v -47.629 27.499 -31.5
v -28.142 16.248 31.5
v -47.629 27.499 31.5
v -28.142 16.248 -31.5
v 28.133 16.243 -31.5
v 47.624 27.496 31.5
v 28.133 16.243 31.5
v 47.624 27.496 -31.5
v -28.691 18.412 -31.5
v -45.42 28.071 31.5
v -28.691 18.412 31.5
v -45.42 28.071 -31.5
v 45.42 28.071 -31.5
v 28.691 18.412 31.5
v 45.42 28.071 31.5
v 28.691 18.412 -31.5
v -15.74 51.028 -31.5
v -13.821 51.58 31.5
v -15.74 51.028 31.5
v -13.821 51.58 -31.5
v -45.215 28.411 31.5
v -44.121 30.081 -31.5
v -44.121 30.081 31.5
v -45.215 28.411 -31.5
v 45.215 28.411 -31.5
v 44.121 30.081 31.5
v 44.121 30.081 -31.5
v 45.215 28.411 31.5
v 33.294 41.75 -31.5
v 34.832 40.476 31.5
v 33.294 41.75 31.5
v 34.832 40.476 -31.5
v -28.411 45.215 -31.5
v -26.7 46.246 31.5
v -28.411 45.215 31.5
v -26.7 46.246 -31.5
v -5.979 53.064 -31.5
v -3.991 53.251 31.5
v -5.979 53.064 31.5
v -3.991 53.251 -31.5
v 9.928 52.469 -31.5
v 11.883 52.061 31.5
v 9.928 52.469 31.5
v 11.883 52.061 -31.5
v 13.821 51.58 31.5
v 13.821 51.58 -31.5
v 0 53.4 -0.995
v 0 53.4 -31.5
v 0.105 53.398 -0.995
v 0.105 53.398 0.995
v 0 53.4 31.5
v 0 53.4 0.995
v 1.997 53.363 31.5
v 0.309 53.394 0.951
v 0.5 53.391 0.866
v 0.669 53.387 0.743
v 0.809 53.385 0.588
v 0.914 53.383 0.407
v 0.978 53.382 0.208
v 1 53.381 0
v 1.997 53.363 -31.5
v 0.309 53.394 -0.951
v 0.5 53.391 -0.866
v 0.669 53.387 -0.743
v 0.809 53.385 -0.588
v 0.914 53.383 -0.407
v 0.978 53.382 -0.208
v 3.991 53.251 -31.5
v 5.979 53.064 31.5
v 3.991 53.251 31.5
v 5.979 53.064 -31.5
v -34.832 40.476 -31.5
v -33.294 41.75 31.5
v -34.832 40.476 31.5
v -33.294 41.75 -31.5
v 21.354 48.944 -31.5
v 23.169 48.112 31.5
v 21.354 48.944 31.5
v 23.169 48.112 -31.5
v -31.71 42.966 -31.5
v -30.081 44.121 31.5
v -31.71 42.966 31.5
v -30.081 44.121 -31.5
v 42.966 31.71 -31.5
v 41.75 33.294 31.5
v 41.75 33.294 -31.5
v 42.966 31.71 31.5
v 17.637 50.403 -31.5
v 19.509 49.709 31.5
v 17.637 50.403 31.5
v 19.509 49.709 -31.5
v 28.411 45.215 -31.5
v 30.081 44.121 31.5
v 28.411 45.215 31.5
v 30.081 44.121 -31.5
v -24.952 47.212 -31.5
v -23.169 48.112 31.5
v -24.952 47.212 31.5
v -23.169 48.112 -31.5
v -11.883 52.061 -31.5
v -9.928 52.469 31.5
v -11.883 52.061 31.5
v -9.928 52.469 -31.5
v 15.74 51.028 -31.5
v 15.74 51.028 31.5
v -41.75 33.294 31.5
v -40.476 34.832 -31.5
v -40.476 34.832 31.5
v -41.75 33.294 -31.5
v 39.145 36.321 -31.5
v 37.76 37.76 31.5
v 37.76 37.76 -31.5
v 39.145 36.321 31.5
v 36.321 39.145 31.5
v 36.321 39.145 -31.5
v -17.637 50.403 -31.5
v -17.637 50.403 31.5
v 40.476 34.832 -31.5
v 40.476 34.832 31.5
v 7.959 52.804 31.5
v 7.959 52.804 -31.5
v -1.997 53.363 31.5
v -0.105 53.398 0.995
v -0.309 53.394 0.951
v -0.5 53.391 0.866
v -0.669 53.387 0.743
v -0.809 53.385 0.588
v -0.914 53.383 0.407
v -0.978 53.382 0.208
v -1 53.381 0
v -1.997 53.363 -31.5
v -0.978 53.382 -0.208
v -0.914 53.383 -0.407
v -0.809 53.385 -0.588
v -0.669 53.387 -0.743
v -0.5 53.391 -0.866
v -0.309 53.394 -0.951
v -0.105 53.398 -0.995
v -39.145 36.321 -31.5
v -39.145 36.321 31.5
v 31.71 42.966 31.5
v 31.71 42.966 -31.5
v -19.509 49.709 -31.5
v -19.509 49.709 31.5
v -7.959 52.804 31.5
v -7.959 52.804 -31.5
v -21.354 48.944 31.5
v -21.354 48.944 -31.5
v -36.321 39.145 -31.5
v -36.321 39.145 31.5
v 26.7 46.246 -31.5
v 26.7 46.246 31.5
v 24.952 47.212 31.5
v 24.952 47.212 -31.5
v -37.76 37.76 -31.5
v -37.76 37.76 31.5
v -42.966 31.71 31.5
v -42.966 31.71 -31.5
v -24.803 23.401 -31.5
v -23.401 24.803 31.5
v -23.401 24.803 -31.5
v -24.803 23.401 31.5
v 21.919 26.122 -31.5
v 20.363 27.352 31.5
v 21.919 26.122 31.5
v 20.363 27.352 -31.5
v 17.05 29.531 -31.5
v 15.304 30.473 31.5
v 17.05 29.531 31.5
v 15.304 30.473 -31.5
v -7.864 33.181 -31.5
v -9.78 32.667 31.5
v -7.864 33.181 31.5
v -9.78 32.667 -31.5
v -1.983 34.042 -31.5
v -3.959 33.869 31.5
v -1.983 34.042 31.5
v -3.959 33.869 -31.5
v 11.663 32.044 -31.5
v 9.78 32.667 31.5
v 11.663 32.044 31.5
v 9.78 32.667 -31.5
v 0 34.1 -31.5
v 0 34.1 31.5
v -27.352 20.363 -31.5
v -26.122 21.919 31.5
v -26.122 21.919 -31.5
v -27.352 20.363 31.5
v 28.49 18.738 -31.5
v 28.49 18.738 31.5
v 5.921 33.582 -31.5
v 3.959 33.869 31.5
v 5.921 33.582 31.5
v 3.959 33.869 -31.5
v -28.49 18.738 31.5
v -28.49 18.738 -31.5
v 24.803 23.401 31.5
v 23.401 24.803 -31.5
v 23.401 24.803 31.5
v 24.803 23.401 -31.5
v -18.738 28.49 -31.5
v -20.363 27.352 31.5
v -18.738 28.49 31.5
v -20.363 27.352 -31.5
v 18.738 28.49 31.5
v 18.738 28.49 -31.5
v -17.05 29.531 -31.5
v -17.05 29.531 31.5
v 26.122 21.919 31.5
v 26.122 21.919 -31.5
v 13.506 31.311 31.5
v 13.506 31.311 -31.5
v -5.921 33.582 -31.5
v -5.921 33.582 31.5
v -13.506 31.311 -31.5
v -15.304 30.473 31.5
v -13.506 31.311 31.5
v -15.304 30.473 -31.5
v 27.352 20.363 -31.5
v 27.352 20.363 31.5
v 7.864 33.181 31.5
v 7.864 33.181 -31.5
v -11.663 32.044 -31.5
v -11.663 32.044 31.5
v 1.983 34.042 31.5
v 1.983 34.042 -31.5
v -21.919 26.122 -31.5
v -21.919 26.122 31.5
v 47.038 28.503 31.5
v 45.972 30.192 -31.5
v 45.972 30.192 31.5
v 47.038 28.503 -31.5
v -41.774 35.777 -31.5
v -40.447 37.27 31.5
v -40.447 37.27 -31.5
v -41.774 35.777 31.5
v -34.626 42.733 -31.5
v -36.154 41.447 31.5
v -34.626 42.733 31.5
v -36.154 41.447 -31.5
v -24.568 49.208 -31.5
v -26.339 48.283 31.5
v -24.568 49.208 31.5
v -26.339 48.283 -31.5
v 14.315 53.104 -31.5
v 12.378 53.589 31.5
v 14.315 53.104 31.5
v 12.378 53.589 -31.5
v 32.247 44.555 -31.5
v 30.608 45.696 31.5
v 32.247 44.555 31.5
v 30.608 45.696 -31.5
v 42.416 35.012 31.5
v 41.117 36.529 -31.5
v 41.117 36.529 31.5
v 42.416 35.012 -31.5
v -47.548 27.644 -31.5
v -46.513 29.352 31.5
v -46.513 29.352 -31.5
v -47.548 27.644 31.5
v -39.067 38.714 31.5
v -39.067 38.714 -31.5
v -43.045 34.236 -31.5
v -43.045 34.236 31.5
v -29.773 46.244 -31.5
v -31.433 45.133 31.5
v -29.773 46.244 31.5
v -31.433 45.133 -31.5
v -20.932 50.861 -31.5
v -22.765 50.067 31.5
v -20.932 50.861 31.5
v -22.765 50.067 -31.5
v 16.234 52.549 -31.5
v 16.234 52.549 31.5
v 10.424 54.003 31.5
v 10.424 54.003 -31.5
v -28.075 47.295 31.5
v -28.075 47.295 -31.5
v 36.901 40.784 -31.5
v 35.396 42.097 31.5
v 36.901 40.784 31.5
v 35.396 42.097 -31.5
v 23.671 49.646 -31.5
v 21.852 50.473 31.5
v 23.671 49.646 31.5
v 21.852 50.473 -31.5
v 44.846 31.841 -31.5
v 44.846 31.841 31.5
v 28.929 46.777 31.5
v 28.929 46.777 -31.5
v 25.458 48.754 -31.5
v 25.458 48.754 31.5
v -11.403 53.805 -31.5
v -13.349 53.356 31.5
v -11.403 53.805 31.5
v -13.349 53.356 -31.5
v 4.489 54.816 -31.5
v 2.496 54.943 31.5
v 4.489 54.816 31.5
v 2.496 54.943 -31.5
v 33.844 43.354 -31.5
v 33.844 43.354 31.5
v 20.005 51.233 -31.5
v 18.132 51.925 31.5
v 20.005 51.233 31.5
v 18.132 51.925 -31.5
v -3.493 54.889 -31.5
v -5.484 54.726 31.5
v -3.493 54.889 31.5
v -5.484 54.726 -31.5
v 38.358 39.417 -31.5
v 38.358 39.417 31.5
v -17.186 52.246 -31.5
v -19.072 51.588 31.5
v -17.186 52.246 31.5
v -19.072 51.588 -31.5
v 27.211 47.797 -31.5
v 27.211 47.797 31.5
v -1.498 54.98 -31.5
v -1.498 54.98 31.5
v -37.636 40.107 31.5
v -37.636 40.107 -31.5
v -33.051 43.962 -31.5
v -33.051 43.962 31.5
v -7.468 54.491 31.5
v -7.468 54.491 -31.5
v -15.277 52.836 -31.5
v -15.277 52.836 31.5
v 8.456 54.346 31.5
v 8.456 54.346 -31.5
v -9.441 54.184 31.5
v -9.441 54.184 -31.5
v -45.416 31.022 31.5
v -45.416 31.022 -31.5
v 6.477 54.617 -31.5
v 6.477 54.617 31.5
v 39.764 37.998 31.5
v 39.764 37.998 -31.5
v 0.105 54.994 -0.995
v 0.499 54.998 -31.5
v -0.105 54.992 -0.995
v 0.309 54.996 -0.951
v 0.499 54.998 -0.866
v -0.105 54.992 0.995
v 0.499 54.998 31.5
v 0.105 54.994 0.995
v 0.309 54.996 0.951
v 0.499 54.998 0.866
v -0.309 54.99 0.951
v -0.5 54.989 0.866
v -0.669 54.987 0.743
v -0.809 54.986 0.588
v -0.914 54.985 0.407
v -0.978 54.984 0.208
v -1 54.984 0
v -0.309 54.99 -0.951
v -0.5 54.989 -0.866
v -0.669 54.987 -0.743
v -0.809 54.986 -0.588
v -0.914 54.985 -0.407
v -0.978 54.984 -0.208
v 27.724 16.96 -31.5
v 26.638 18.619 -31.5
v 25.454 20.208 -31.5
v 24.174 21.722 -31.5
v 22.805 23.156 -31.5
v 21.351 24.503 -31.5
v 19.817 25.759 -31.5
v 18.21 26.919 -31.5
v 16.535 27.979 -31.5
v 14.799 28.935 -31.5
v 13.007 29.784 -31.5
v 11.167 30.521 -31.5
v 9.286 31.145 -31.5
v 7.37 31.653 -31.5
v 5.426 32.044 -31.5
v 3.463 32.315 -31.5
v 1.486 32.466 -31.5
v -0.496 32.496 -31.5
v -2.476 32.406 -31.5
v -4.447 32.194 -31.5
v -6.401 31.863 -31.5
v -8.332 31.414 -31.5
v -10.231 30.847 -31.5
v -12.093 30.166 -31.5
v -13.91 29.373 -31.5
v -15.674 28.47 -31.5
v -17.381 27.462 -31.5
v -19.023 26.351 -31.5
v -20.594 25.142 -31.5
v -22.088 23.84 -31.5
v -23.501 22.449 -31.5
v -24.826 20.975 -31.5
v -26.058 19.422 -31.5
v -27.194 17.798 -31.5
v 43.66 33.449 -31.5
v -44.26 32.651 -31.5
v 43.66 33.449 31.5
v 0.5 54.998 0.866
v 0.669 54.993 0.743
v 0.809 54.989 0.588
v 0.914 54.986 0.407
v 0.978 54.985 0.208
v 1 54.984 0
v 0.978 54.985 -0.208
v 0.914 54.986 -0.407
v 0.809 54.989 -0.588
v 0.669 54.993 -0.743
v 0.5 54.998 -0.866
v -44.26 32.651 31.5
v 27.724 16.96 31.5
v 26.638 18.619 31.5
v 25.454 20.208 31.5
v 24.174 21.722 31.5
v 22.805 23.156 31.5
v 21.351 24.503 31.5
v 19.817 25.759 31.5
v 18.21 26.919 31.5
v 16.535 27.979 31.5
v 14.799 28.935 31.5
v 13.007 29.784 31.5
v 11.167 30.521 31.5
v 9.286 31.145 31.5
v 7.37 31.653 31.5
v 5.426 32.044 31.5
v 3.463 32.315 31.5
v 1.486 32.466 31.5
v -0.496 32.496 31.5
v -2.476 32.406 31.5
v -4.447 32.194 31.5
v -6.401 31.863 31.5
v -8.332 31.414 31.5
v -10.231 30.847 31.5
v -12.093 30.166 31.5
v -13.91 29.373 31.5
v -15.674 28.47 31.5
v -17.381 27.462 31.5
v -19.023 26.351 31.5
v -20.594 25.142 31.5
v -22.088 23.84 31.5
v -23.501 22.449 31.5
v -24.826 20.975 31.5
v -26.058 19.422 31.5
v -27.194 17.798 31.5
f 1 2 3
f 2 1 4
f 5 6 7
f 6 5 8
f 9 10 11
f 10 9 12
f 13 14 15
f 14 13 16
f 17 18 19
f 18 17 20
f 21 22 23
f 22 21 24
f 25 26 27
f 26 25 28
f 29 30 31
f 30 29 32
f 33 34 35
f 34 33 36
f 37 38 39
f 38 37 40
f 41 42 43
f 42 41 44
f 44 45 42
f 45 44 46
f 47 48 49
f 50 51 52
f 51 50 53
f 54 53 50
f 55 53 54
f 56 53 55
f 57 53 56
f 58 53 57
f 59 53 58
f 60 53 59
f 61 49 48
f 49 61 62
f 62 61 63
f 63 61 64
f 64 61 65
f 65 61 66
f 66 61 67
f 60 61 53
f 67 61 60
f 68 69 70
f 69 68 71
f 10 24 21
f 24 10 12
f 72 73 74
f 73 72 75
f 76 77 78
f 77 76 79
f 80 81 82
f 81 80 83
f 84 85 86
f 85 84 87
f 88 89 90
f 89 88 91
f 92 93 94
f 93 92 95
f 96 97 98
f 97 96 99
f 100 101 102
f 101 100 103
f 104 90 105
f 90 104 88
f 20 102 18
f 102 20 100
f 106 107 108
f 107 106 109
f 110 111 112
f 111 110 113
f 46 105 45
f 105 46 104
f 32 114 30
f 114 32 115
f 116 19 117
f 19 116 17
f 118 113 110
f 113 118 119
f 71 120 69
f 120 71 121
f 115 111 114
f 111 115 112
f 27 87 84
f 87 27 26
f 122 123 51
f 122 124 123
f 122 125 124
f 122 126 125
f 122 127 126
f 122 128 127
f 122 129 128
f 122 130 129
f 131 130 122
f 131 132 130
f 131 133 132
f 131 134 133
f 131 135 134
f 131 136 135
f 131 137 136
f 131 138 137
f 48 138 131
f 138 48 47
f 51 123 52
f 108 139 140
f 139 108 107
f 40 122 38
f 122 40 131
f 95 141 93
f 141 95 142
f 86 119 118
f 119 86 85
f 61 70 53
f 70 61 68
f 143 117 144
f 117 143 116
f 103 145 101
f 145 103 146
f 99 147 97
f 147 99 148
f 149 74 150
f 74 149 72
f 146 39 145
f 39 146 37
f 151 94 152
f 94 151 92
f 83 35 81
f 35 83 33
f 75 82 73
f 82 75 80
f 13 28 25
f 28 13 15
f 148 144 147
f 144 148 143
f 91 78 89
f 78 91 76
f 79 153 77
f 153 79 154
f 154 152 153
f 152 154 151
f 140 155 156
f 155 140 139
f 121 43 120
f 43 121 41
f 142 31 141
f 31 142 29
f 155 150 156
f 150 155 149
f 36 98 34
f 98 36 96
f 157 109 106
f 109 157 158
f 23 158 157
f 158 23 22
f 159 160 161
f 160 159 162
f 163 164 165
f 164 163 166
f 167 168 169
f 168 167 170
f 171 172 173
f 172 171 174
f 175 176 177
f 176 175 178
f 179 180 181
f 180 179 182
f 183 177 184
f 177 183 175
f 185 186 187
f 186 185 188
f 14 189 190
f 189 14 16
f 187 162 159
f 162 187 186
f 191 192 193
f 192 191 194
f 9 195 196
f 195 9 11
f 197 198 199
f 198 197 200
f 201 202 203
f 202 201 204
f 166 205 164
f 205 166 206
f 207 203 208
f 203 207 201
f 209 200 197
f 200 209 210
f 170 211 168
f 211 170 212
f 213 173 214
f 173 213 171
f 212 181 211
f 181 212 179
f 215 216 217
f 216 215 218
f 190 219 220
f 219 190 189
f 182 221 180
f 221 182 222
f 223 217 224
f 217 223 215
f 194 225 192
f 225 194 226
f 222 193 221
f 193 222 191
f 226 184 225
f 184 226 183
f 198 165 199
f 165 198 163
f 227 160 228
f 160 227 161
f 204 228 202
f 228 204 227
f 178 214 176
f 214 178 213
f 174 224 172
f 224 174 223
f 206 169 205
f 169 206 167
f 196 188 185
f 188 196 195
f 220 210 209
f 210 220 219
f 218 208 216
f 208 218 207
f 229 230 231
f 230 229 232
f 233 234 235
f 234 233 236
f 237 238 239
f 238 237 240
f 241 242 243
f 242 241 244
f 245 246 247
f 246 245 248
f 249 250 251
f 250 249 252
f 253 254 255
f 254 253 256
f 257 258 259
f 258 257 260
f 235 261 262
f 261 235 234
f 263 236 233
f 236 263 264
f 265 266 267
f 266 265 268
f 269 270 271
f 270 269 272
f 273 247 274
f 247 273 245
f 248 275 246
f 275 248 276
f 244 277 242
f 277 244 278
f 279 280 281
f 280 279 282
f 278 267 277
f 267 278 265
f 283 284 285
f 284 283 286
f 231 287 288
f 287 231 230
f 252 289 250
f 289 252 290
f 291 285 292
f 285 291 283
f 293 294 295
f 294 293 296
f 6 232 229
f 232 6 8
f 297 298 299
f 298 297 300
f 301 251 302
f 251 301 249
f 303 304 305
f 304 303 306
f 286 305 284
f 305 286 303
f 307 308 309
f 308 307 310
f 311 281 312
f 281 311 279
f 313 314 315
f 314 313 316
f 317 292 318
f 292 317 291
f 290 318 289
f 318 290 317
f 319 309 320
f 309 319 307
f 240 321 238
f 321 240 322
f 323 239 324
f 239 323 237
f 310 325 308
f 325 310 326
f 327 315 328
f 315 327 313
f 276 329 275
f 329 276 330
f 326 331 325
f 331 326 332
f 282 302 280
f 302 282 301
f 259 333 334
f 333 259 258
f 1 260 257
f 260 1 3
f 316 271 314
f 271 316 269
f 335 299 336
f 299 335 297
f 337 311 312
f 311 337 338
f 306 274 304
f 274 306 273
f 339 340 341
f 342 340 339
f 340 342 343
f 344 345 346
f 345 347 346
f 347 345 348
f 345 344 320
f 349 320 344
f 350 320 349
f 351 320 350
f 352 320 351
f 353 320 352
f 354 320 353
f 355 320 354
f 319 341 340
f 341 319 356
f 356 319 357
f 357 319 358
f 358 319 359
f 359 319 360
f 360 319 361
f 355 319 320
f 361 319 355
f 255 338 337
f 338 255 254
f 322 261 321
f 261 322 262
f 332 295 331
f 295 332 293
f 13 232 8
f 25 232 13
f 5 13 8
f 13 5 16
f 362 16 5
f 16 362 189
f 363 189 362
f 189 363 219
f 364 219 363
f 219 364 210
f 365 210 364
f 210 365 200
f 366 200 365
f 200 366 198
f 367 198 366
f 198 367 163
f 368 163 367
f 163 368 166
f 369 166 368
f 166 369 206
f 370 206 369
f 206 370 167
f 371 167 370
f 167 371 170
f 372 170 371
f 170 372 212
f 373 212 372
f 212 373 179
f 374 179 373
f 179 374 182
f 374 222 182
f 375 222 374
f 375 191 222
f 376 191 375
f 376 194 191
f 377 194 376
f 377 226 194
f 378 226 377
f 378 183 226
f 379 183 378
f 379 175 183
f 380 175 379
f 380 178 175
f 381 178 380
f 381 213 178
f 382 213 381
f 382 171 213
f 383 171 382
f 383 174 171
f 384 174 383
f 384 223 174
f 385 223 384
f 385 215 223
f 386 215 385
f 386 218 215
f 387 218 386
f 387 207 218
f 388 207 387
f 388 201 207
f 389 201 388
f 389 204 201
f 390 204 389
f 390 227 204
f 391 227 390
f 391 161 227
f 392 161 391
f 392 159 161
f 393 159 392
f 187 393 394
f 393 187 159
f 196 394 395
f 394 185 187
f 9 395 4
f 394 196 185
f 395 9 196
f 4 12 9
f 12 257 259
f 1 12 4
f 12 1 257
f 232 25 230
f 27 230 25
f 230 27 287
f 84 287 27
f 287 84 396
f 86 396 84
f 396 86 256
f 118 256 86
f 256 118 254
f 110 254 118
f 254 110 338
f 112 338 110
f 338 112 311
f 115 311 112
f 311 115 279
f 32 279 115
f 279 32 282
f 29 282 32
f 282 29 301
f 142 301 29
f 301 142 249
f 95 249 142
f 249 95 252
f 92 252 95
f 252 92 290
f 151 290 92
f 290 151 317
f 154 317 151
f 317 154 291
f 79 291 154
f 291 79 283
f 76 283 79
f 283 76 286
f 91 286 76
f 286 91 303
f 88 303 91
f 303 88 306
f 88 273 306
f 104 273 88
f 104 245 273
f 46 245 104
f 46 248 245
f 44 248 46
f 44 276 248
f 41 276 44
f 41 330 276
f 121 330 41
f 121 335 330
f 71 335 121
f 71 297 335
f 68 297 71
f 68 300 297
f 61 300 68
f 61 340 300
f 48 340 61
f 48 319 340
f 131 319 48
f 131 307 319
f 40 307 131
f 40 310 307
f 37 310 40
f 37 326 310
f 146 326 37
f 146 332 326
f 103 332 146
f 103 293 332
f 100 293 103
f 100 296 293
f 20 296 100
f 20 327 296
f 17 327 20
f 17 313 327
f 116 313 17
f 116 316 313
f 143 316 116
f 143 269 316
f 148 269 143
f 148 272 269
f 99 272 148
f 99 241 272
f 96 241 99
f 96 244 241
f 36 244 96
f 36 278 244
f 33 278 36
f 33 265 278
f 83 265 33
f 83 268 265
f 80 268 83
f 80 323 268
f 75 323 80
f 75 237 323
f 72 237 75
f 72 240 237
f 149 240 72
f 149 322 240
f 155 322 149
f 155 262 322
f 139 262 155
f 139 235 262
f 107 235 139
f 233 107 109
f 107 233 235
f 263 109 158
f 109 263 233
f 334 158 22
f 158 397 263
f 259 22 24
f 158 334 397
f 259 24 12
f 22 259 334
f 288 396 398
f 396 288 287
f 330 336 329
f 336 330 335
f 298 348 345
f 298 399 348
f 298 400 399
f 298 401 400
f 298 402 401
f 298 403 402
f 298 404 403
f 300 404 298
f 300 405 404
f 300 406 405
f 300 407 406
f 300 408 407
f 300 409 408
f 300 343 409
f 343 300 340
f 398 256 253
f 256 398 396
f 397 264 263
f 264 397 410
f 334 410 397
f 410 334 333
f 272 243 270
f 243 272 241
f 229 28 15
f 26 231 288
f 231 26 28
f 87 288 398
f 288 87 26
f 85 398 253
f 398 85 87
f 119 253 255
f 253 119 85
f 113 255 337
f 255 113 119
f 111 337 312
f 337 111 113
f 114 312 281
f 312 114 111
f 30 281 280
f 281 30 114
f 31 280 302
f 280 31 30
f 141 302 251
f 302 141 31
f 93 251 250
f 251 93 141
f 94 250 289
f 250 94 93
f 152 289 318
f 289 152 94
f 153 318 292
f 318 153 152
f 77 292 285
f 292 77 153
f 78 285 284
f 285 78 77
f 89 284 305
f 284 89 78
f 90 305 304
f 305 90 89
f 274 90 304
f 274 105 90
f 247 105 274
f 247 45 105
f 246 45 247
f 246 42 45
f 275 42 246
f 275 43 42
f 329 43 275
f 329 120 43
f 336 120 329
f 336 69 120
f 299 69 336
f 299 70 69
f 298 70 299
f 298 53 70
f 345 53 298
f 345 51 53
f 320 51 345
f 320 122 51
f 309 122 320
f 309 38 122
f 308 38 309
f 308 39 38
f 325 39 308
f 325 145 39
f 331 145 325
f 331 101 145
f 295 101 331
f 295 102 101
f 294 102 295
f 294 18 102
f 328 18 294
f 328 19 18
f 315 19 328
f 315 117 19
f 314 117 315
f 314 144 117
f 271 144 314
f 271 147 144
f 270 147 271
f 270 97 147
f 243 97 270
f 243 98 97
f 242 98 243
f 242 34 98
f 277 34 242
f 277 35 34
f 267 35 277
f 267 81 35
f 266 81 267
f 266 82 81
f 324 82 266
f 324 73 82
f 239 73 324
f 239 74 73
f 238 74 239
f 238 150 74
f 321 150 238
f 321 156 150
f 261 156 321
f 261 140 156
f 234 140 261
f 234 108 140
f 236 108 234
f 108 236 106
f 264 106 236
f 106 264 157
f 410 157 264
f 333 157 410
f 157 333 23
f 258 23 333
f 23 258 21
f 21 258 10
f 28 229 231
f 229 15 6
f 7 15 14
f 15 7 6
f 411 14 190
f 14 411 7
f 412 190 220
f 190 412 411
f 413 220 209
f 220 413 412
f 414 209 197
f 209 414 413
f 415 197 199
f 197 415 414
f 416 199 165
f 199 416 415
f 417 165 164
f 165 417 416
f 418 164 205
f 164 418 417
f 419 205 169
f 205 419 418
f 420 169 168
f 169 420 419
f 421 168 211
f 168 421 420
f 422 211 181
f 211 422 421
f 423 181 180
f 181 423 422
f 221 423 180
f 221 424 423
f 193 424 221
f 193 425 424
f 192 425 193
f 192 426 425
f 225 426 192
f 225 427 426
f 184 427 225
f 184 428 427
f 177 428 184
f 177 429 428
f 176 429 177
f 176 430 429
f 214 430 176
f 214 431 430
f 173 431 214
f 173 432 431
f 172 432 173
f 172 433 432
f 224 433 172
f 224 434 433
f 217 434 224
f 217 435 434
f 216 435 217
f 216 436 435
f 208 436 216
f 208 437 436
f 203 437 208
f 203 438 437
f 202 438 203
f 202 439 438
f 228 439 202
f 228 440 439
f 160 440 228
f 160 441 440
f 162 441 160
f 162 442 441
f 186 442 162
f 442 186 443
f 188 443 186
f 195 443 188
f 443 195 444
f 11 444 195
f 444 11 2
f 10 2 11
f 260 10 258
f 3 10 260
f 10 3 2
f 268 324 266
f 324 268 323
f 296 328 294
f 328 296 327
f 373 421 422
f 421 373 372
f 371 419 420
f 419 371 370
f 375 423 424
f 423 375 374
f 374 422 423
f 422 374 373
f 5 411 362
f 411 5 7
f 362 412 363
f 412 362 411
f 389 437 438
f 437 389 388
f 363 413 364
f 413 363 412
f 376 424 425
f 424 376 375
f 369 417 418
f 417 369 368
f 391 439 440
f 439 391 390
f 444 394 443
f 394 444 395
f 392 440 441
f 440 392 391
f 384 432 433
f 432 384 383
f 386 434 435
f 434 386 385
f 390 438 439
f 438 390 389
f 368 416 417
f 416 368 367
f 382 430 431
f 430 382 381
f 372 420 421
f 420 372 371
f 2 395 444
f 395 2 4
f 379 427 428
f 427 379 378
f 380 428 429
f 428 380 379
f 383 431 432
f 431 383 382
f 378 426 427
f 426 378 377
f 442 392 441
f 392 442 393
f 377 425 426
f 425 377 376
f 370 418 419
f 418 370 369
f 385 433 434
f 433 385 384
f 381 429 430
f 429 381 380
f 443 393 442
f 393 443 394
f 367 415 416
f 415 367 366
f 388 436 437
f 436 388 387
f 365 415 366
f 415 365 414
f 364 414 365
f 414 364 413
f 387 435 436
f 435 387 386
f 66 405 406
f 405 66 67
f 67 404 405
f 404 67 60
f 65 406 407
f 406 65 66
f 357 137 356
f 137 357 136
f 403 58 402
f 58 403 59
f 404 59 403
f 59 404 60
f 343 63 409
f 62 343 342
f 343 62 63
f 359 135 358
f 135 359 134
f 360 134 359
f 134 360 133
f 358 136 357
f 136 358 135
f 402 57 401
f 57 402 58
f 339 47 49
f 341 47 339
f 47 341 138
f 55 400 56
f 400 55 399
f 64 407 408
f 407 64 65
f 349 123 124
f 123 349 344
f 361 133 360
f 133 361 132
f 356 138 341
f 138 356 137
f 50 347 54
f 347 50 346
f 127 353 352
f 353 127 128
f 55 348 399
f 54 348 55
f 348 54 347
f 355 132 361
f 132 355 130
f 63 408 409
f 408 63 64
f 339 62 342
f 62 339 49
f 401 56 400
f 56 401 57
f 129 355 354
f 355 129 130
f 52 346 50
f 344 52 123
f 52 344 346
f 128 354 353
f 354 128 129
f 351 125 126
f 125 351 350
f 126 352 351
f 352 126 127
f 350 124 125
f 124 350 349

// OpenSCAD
// Input variables
seg_thk = 63;       // Width of spool between flanges
inner_dia = 65;     // Radius of spool hub
wall = 1.6;         // 4 runs @ 0.4 nozzle
hole_dia = 2;       // Filament fix hole

width = 22.5;     // Required width of segment
arc = 120;      // segment length in degrees

// Calculated variables
inner_rad = inner_dia/2;
outer_rad = inner_rad+width;    // New spool hub radius
clear_thk = seg_thk+2;          // extra thick for cuts to work
ang = (180-arc)/2;

// Overall definition
$fa=1;

// Cut away half of a cylinder
module CutHalf(y_off,extra_thk)
{
translate([0,-y_off,0])
    cube([outer_rad*2,inner_rad*2,seg_thk+extra_thk],true);
}
// Which halves to cut
module trim()
{
    for (cut = [-ang,ang]) rotate(cut) children();
}

// Program
difference()
    {
    cylinder(h=seg_thk,r=outer_rad,center=true);   // New hub 

    cylinder(h=seg_thk+2,r=inner_rad,center=true);    // Loose existing hub
    trim() CutHalf(inner_rad,2);     // Loose sides
    translate([0,inner_rad+2*wall,0]) rotate([-90,0,0])
        cylinder(d=hole_dia,h=width,$fn=30);
    difference()    // Now hollow out the segment
        {
        cylinder(h=seg_thk+2,r=outer_rad-wall,center=true);

        cylinder(h=seg_thk+4,r=inner_rad+wall,center=true);
        trim() CutHalf(inner_rad-wall,4);
        }
    }
